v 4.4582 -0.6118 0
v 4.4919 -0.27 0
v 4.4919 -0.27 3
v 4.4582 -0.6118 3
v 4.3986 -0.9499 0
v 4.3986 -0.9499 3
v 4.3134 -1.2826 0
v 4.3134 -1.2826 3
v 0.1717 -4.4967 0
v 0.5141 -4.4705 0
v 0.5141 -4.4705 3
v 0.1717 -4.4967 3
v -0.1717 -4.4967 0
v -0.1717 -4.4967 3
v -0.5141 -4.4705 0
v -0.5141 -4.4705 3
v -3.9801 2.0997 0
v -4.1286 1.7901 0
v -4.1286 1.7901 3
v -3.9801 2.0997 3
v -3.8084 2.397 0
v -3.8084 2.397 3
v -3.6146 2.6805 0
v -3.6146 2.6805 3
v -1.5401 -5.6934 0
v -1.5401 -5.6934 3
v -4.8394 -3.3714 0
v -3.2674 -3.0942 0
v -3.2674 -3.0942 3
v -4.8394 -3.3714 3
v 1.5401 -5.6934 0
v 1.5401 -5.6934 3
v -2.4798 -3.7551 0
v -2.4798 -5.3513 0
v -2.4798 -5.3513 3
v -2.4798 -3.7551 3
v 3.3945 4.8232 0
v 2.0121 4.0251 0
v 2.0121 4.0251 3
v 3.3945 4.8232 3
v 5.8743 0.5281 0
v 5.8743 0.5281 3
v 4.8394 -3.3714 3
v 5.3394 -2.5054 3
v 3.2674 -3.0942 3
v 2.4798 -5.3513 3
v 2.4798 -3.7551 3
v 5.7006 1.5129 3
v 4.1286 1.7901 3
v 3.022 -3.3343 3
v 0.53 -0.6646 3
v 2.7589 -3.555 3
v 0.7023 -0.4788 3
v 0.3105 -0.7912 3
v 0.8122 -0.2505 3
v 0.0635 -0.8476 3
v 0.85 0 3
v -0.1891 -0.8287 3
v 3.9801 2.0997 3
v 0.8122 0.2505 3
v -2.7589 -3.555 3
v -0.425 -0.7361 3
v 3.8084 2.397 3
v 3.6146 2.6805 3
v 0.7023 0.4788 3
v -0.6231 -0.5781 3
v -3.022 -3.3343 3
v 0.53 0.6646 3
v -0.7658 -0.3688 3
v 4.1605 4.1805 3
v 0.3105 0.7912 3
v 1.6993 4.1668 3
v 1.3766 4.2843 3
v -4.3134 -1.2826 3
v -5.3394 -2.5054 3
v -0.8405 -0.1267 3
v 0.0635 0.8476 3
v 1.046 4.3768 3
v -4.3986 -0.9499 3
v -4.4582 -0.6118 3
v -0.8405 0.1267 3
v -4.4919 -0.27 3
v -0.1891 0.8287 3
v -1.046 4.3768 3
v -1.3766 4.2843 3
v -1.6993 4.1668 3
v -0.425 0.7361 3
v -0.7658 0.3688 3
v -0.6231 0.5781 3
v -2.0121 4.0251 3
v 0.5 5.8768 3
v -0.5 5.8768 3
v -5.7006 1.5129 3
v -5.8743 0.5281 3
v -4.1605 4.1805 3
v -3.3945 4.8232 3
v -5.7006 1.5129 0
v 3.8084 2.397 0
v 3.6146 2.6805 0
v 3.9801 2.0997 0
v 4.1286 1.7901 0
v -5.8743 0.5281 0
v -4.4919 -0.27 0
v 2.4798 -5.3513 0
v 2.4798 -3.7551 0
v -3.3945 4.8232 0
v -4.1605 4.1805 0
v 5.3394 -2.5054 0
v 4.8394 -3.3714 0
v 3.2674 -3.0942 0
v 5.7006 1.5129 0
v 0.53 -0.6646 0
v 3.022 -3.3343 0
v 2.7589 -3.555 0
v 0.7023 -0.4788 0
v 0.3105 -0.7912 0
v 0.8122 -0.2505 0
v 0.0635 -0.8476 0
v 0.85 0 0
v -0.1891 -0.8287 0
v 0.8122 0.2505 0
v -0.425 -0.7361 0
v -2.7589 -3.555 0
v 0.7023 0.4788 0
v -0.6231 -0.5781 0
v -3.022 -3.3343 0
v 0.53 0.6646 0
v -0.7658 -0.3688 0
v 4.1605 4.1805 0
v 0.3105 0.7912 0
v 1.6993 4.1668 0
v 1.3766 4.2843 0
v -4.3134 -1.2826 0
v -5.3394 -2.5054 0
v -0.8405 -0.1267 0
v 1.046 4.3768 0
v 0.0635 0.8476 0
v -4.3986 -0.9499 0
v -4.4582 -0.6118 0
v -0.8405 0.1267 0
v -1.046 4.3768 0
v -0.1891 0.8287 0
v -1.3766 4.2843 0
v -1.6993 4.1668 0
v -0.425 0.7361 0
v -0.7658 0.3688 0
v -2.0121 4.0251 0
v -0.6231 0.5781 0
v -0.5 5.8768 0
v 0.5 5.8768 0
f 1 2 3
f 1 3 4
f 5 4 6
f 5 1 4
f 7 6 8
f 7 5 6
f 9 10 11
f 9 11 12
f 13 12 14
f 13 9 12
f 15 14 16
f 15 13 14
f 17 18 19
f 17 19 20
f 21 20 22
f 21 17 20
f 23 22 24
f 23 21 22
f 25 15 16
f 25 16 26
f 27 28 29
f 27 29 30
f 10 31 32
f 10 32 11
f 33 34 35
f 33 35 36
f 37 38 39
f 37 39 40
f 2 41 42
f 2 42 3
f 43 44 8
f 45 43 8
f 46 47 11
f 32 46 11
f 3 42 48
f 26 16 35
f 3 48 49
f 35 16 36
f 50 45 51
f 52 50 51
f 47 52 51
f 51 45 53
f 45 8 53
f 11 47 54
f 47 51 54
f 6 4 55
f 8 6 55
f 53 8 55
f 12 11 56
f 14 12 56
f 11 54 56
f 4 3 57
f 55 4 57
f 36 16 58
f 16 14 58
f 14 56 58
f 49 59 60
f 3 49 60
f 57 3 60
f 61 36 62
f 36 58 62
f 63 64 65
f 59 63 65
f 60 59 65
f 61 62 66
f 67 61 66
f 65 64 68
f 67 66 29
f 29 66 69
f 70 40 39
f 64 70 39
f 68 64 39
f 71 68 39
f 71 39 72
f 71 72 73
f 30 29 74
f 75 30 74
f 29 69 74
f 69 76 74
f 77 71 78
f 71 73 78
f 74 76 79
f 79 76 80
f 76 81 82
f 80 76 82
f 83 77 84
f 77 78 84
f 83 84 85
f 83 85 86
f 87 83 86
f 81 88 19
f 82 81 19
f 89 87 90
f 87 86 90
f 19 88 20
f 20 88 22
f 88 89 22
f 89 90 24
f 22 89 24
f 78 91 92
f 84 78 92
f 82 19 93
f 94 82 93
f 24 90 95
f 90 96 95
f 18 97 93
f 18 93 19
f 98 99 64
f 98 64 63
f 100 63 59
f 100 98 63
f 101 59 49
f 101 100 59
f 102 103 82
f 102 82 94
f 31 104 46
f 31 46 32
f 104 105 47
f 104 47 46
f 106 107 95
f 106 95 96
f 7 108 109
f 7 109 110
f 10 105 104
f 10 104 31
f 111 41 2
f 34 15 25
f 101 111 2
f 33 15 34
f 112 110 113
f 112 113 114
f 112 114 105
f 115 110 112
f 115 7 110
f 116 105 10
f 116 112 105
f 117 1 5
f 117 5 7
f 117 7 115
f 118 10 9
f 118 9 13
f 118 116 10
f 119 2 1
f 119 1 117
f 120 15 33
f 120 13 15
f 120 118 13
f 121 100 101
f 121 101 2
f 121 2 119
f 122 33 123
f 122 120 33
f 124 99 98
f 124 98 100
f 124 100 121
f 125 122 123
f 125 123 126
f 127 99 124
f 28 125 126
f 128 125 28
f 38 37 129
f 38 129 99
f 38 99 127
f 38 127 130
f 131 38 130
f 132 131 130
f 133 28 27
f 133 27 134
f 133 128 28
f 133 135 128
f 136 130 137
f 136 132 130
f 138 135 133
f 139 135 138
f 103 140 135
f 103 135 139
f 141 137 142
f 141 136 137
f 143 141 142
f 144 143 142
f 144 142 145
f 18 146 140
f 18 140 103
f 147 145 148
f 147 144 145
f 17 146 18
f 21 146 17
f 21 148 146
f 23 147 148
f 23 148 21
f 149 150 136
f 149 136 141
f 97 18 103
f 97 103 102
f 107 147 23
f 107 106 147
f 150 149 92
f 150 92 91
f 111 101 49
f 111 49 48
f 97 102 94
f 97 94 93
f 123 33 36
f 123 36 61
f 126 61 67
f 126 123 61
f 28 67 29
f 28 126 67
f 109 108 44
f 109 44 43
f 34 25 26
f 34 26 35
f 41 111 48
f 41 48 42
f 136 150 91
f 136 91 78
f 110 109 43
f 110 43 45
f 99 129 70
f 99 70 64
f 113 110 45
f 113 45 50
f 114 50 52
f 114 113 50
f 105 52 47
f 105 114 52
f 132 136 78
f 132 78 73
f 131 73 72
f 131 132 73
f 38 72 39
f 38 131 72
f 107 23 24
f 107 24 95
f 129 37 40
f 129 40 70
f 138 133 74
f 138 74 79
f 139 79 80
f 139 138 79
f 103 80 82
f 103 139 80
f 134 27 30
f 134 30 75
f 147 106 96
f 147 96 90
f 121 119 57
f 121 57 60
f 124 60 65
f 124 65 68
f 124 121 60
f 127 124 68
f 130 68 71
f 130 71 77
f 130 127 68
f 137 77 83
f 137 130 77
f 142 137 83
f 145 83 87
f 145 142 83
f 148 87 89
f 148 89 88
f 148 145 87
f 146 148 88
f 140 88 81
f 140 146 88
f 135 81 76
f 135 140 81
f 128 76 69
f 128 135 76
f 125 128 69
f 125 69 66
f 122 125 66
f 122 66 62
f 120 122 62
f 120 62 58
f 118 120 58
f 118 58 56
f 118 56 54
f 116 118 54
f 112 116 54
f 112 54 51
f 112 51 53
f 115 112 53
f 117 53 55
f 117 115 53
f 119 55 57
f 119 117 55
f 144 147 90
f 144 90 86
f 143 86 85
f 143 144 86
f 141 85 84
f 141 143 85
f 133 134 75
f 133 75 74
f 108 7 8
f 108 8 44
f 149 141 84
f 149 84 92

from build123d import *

# Parameters (mm, degrees)
SKETCH1_R           = 0.85
BOSS_EXTRUDE1_DEPTH = 3


with BuildPart() as part:
    # Sketch1 → Boss-Extrude1 (new body)
    with BuildSketch(Plane.XY):
        with BuildLine():
            Line((2.012075091, 4.025115381), (3.394482569, 4.82324871))
            Line((3.394482569, 4.82324871), (4.160527012, 4.1804611))
            Line((4.160527012, 4.1804611), (3.614571661, 2.6804611))
            ThreePointArc((3.614571661, 2.6804611), (3.897114317, 2.25), (4.128633237, 1.790080332))
            Line((4.128633237, 1.790080332), (5.700649018, 1.512891535))
            Line((5.700649018, 1.512891535), (5.874297196, 0.528083782))
            Line((5.874297196, 0.528083782), (4.491889718, -0.270049547))
            ThreePointArc((4.491889718, -0.270049547), (4.431634889, -0.7814168), (4.313358007, -1.282553199))
            Line((4.313358007, -1.282553199), (5.339418436, -2.505364402))
            Line((5.339418436, -2.505364402), (4.839418436, -3.371389806))
            Line((4.839418436, -3.371389806), (3.267402655, -3.09420101))
            ThreePointArc((3.267402655, -3.09420101), (2.892544244, -3.447199994), (2.479814627, -3.755065834))
            Line((2.479814627, -3.755065834), (2.479814627, -5.351332492))
            Line((2.479814627, -5.351332492), (1.540122006, -5.693352636))
            Line((1.540122006, -5.693352636), (0.514061576, -4.470541432))
            ThreePointArc((0.514061576, -4.470541432), (0, -4.5), (-0.514061576, -4.470541432))
            Line((-0.514061576, -4.470541432), (-1.540122006, -5.693352636))
            Line((-1.540122006, -5.693352636), (-2.479814627, -5.351332492))
            Line((-2.479814627, -5.351332492), (-2.479814627, -3.755065834))
            ThreePointArc((-2.479814627, -3.755065834), (-2.892544244, -3.447199994), (-3.267402655, -3.09420101))
            Line((-3.267402655, -3.09420101), (-4.839418436, -3.371389806))
            Line((-4.839418436, -3.371389806), (-5.339418436, -2.505364402))
            Line((-5.339418436, -2.505364402), (-4.313358007, -1.282553199))
            ThreePointArc((-4.313358007, -1.282553199), (-4.431634889, -0.7814168), (-4.491889718, -0.270049547))
            Line((-4.491889718, -0.270049547), (-5.874297196, 0.528083782))
            Line((-5.874297196, 0.528083782), (-5.700649018, 1.512891535))
            Line((-5.700649018, 1.512891535), (-4.128633237, 1.790080332))
            ThreePointArc((-4.128633237, 1.790080332), (-3.897114317, 2.25), (-3.614571661, 2.6804611))
            Line((-3.614571661, 2.6804611), (-4.160527012, 4.1804611))
            Line((-4.160527012, 4.1804611), (-3.394482569, 4.82324871))
            Line((-3.394482569, 4.82324871), (-2.012075091, 4.025115381))
            ThreePointArc((-2.012075091, 4.025115381), (-1.539090645, 4.228616794), (-1.045955351, 4.376754209))
            Line((-1.045955351, 4.376754209), (-0.5, 5.876754209))
            Line((-0.5, 5.876754209), (0.5, 5.876754209))
            Line((0.5, 5.876754209), (1.045955351, 4.376754209))
            ThreePointArc((1.045955351, 4.376754209), (1.539090645, 4.228616794), (2.012075091, 4.025115381))
        make_face()
        Circle(SKETCH1_R, mode=Mode.SUBTRACT)
    extrude(amount=BOSS_EXTRUDE1_DEPTH)


solid = part.part
